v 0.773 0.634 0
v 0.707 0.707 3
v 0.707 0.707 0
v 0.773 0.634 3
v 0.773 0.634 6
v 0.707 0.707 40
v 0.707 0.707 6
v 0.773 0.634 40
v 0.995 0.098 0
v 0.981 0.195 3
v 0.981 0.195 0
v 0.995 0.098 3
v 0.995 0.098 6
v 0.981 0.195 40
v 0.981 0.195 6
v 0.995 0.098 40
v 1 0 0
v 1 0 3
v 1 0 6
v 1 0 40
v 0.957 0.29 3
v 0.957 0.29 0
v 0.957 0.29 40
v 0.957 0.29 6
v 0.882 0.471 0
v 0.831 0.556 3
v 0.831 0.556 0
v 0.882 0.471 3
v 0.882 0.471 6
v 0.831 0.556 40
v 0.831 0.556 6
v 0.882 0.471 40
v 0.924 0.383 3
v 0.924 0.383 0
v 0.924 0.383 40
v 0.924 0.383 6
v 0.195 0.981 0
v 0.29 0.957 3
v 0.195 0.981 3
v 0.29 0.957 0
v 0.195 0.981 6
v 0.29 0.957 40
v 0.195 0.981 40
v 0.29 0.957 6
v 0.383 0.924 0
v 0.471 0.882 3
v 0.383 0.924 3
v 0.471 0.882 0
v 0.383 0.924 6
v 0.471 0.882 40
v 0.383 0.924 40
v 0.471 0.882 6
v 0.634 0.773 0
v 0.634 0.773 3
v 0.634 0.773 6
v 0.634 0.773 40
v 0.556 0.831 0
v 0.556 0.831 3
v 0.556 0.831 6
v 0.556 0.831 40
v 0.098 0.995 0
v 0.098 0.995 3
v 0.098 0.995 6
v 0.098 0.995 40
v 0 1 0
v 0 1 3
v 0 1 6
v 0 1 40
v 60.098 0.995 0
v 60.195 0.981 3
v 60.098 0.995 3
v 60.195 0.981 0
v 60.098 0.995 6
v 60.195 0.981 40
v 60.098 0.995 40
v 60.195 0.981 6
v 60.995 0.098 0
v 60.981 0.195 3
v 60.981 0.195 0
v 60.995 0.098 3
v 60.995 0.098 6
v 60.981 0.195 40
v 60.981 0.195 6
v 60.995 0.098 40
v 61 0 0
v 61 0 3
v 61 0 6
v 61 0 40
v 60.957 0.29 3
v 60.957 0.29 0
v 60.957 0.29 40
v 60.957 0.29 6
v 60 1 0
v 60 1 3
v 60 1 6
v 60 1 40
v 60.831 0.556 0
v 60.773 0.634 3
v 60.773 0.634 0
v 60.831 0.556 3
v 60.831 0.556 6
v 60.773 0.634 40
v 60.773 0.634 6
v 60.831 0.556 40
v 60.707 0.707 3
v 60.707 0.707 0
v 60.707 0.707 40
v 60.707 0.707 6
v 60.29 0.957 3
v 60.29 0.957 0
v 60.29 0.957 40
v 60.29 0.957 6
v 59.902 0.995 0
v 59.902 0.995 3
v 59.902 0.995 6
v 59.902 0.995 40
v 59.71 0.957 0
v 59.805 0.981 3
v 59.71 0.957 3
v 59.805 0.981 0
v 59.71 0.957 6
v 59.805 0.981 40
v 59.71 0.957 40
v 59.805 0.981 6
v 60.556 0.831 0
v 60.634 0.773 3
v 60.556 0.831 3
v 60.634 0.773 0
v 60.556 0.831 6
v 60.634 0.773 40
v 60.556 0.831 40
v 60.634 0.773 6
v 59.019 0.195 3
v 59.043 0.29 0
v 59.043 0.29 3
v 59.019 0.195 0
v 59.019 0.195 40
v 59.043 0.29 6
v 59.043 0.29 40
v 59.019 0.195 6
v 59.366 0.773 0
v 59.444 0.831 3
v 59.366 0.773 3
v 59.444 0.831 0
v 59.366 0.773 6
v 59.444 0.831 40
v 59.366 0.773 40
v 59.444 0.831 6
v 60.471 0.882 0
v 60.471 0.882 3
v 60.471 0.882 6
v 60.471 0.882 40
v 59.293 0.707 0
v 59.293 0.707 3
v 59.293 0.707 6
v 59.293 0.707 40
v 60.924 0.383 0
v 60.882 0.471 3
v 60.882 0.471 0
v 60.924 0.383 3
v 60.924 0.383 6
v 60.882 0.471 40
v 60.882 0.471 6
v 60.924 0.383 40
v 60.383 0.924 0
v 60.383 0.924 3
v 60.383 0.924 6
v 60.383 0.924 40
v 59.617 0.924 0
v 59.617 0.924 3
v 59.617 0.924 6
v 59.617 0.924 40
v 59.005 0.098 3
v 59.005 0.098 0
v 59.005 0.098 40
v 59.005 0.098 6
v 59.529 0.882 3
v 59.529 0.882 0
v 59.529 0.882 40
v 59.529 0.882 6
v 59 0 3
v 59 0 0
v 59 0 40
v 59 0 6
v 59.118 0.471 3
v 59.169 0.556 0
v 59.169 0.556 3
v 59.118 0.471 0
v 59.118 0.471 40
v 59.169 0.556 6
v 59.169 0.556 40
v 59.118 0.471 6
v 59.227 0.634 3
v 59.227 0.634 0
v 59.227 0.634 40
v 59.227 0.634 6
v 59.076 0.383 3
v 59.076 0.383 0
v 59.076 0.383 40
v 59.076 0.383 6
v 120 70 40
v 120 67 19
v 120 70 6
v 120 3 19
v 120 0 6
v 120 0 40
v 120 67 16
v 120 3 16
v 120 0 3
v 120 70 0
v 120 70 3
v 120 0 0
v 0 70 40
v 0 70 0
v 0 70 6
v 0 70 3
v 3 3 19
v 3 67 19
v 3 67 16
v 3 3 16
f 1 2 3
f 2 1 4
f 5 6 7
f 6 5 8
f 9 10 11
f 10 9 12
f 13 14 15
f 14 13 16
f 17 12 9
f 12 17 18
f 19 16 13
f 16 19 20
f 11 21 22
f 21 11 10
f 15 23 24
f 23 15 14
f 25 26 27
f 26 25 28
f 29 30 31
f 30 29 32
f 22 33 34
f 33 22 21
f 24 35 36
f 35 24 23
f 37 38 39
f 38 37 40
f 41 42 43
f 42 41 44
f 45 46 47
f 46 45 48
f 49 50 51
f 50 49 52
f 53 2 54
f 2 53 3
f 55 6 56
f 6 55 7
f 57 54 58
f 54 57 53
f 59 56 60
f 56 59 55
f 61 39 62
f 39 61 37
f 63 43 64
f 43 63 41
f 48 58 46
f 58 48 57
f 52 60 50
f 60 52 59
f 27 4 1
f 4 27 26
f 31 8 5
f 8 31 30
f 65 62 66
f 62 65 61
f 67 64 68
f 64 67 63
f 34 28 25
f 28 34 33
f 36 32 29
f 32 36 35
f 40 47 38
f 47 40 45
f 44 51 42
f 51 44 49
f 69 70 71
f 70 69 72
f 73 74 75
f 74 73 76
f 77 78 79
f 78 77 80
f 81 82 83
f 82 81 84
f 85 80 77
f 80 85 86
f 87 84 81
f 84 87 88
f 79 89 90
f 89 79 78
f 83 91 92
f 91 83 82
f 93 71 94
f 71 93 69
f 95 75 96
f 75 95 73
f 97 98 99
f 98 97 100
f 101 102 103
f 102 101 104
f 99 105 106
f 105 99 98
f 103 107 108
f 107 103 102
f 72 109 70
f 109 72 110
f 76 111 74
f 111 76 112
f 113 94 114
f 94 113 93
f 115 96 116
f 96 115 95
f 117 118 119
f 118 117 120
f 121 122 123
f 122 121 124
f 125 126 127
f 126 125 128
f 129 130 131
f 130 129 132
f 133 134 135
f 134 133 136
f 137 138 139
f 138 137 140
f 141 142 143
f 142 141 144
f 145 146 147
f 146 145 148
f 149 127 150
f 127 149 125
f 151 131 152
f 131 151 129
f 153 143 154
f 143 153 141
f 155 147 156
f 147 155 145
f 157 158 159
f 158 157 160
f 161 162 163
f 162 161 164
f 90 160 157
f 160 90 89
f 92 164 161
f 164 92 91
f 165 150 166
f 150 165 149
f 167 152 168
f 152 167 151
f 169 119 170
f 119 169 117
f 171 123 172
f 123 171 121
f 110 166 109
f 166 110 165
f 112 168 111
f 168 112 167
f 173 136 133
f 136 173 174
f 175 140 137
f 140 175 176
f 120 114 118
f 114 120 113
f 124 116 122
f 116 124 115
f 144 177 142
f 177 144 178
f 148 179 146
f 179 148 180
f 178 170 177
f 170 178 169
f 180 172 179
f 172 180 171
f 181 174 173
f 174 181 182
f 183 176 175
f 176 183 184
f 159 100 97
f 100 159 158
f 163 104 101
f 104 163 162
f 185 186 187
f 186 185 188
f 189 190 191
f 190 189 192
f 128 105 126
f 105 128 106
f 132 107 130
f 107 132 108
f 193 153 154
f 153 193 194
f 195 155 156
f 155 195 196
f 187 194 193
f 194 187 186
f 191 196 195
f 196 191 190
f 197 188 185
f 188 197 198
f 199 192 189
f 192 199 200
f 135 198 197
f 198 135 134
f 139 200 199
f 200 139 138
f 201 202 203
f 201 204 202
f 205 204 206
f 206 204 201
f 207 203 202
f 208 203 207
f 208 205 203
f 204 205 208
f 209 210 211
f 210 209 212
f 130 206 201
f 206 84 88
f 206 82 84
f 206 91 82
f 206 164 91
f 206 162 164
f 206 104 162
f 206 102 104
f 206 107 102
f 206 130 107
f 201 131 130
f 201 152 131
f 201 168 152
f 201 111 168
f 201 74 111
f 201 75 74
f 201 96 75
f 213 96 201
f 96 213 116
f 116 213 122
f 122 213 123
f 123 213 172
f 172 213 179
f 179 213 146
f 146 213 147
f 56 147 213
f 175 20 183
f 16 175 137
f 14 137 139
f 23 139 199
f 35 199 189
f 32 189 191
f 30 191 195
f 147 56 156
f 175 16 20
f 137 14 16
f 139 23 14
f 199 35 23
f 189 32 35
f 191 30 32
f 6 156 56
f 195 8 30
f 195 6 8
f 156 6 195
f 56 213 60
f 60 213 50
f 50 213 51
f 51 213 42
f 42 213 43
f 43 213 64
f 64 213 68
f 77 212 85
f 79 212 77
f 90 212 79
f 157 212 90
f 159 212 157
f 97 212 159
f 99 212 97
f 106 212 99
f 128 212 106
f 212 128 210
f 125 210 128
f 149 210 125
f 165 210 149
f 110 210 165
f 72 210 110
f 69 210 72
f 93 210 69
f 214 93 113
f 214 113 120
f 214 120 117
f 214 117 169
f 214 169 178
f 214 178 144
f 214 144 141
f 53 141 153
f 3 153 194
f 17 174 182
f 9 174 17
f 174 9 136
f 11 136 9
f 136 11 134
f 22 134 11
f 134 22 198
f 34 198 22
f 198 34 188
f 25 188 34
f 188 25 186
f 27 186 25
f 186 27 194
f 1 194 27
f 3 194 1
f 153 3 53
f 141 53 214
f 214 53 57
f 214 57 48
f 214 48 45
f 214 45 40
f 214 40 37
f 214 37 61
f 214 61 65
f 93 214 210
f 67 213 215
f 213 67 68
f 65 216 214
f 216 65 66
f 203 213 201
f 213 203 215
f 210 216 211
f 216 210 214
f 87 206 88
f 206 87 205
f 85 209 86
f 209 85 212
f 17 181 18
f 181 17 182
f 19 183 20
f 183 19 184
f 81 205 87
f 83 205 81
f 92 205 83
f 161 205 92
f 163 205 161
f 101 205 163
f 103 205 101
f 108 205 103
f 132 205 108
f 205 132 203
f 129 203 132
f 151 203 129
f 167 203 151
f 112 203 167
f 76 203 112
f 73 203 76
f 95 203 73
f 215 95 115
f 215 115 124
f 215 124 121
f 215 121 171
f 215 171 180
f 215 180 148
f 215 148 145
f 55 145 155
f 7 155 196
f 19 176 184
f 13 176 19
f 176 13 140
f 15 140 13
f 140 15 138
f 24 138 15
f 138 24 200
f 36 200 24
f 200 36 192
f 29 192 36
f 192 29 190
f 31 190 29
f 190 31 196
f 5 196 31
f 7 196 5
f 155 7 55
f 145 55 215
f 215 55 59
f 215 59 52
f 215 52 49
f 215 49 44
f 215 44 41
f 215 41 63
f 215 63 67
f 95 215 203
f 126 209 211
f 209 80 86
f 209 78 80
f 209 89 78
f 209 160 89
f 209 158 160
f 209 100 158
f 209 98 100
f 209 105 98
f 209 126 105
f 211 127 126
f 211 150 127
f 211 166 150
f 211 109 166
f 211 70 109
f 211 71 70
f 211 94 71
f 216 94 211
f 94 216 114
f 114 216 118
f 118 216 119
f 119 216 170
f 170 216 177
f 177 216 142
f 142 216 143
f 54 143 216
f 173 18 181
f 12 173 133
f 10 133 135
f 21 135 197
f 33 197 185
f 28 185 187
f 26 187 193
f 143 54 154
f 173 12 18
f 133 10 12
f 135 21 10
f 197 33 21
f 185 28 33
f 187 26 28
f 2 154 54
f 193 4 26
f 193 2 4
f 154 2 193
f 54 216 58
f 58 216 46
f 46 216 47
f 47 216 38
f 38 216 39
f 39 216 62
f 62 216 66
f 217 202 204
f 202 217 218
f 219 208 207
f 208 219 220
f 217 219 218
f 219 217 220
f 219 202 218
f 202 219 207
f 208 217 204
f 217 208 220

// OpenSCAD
// Reservoir - a buffer tank for a mini horizontal gel electrophoresis box, with a raised gel
// tray platform and horizontal electrode holes. NOVEL general part.
//

L   = 120;
W   = 70;
H   = 40;
wall = 3;
floor = 3;
platform_L = 60;
platform_z = 13;

$fn = 64;

inner_W = W - 2 * wall;
inner_H = H - floor;

difference() {
    cube([L, W, H]);
    translate([0, 0, floor]) cube([L, W, H - inner_H]);     // remove everything above the floor
    translate([wall, wall, floor]) cube([L - 2 * wall, W - 2 * wall, floor]);  // re-add the floor

    platform_z0 = floor + platform_z;
    translate([wall, wall, platform_z0])
        cube([platform_L, W - 2 * wall, wall]);              // left chamber floor under the platform
    translate([L - platform_L + wall, wall, platform_z0])
        cube([platform_L, W - 2 * wall, wall]);              // right chamber floor under the platform

    for (x = [L / 2, L])
        translate([x - L / 2, 0, -1])
            cylinder(h = H + 2, d = 2);                     // horizontal electrode holes
}
